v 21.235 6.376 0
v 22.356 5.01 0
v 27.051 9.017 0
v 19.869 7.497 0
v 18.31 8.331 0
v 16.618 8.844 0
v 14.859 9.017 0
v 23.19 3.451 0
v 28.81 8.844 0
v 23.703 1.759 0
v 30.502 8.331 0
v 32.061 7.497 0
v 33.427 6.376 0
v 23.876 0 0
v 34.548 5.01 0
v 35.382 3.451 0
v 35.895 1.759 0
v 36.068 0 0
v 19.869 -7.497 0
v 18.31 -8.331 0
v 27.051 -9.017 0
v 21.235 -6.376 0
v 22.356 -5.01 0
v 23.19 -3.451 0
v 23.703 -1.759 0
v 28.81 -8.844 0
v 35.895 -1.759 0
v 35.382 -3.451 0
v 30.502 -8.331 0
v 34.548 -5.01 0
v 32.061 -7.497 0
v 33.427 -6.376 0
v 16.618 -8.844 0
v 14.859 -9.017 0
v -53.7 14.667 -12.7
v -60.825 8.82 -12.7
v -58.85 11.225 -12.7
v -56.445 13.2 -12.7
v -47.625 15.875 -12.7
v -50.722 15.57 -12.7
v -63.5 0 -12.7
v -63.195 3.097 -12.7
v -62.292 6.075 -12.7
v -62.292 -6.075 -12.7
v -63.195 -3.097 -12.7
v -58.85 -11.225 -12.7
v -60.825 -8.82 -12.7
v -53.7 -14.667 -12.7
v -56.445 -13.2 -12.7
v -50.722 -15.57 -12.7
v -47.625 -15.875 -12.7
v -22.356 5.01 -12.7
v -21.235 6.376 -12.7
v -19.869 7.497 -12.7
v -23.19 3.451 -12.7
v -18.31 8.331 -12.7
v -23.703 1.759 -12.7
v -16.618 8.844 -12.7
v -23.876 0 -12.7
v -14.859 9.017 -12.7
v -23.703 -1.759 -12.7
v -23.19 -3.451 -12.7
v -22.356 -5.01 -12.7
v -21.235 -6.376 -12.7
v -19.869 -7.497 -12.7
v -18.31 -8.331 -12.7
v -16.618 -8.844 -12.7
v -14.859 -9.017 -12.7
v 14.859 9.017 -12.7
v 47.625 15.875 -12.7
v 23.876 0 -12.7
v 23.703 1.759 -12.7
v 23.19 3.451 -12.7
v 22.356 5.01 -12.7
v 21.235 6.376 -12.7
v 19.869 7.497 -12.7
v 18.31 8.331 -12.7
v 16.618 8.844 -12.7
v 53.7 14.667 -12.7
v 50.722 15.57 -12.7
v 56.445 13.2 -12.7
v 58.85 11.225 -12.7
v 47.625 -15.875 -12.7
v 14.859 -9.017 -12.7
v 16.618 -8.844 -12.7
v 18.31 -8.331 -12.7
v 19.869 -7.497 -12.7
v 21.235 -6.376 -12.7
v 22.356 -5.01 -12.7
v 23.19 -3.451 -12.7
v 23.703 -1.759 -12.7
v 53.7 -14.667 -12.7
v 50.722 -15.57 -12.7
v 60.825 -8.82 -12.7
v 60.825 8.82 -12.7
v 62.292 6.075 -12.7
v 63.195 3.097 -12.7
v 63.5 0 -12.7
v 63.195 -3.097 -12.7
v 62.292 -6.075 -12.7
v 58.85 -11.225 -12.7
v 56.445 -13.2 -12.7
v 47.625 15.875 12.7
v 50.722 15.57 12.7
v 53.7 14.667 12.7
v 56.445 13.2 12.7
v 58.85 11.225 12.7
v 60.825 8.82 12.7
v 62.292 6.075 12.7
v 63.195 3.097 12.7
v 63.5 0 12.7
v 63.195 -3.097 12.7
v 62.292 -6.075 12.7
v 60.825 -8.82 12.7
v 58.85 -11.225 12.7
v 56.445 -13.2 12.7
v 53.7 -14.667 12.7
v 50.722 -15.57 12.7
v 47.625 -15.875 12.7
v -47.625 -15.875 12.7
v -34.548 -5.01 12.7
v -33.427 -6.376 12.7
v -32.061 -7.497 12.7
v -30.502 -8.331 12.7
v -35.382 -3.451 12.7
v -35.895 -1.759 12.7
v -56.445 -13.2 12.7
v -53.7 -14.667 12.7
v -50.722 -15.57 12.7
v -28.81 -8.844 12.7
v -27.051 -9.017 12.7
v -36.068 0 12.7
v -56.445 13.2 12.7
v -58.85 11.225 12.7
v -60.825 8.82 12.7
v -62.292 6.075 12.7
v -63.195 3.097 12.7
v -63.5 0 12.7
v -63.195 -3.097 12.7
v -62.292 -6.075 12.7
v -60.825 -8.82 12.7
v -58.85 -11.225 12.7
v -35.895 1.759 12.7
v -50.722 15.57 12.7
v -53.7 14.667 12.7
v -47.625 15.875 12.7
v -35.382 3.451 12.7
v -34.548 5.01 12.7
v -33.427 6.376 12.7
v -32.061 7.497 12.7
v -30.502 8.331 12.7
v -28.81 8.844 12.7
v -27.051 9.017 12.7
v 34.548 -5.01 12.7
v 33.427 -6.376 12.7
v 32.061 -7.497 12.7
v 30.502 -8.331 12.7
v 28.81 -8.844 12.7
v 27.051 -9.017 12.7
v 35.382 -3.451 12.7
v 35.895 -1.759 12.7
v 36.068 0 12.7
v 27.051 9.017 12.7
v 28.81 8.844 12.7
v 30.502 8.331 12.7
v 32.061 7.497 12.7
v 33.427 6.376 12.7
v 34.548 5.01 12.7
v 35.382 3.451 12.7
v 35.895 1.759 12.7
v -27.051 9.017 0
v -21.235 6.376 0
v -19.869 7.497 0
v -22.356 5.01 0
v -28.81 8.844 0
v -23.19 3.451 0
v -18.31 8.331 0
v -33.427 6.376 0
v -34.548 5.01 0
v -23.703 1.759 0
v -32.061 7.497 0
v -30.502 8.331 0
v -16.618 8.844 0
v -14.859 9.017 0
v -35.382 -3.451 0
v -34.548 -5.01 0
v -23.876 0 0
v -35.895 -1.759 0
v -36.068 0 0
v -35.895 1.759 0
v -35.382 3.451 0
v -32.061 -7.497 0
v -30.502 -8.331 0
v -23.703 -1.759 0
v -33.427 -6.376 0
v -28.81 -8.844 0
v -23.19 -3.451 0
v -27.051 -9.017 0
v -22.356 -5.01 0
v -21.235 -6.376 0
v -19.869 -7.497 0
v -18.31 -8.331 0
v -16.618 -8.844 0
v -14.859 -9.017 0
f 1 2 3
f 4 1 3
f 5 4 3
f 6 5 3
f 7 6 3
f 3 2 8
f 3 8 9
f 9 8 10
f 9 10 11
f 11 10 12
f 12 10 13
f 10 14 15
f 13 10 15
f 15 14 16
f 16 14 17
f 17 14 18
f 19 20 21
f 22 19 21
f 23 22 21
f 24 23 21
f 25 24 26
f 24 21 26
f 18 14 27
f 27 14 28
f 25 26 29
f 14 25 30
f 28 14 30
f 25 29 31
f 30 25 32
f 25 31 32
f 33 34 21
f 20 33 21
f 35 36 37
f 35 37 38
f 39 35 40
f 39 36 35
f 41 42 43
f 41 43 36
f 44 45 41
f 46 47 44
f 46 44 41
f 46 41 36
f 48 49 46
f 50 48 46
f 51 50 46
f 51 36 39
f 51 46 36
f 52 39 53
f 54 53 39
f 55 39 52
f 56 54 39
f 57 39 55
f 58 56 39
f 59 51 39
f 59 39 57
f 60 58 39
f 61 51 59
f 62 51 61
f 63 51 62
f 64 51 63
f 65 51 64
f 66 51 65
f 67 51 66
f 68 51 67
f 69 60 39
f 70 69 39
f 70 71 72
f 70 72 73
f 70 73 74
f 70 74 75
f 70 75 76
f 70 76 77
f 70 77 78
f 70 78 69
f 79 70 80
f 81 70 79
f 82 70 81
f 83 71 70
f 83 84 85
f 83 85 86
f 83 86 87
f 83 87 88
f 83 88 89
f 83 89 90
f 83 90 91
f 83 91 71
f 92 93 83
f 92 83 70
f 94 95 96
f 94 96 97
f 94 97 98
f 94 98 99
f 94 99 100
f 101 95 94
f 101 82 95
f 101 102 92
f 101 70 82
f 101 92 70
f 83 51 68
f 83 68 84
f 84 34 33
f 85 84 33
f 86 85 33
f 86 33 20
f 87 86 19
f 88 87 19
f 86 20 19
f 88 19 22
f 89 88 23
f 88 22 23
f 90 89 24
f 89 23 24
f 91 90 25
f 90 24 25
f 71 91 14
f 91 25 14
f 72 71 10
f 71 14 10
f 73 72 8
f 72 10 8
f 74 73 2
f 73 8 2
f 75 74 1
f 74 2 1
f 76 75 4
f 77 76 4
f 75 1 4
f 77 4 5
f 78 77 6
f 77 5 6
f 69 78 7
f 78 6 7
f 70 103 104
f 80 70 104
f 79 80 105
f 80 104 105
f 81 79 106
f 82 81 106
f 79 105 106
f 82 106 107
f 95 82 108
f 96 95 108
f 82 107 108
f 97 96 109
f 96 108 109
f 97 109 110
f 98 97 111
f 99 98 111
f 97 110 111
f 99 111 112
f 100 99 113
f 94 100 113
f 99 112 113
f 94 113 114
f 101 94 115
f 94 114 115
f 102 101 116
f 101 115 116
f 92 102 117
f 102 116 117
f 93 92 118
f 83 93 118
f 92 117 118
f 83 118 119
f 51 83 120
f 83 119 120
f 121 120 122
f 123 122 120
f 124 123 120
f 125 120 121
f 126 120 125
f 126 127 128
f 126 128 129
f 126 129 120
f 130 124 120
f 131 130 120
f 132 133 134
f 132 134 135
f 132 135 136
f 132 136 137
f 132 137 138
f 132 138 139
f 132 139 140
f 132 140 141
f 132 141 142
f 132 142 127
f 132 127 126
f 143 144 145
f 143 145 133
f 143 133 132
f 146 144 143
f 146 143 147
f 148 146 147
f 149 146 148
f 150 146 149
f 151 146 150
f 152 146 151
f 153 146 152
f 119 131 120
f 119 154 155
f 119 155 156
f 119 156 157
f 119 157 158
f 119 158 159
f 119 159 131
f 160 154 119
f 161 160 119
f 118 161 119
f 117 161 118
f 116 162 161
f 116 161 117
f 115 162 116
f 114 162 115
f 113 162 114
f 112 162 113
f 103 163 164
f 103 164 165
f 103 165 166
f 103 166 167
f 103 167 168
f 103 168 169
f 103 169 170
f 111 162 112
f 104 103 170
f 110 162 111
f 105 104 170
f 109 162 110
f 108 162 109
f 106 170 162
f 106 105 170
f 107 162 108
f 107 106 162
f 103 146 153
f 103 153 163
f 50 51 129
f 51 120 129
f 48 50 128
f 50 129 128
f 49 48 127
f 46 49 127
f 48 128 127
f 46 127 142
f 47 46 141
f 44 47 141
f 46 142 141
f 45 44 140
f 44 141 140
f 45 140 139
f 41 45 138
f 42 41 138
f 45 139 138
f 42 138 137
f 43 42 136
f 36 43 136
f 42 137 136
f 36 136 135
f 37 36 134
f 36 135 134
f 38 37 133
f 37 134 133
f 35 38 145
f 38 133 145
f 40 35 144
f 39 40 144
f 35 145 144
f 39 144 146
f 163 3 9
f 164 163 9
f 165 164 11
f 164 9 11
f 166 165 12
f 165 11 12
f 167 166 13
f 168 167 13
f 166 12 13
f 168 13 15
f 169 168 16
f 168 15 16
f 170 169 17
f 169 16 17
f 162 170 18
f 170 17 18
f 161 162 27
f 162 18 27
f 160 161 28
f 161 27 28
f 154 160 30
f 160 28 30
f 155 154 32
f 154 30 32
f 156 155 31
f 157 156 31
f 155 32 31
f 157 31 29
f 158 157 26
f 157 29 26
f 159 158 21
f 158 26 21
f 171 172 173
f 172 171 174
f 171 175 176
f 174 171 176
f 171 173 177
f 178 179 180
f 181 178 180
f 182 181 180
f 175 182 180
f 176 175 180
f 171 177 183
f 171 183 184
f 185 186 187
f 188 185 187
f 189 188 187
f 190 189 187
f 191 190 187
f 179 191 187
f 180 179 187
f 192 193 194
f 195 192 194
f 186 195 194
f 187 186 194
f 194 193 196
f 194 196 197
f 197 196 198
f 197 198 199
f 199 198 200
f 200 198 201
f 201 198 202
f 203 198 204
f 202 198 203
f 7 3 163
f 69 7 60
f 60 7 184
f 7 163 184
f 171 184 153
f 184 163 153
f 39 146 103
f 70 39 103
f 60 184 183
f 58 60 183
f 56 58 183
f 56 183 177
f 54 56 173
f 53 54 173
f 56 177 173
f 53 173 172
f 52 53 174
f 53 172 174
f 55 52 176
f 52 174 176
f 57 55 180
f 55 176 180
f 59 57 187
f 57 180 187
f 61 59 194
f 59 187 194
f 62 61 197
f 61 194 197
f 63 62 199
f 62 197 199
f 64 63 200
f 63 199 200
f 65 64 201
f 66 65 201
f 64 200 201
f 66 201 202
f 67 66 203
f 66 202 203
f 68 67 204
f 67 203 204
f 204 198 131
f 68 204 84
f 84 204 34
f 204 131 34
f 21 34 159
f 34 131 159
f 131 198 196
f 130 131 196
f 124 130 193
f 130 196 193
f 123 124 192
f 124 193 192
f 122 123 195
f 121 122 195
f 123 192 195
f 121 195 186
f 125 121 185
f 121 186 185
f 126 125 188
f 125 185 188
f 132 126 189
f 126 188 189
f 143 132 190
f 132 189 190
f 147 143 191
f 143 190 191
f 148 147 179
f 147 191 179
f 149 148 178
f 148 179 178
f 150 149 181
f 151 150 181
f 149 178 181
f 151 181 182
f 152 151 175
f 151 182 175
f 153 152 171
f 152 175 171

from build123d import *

# Parameters (mm, degrees)
F1_DEPTH = 12.7
F3_DEPTH = 12.7


with BuildPart() as f1:
    # F0 (on Top) → F1 (new body)
    with BuildSketch(Plane.XY):
        with BuildLine():
            Line((-47.625, -15.875), (47.625, -15.875))
            ThreePointArc((47.625, -15.875), (63.5, 0), (47.625, 15.875))
            Line((47.625, 15.875), (-47.625, 15.875))
            ThreePointArc((-47.625, 15.875), (-63.5, 0), (-47.625, -15.875))
        make_face()
        with BuildLine():
            ThreePointArc((27.051, 9.017), (36.068, 0), (27.051, -9.017))
            Line((27.051, -9.017), (-27.051, -9.017))
            ThreePointArc((-27.051, -9.017), (-36.068, 0), (-27.051, 9.017))
            Line((-27.051, 9.017), (27.051, 9.017))
        make_face(mode=Mode.SUBTRACT)
    extrude(amount=F1_DEPTH)

    # F2 (on face) → F3 (join)
    with BuildSketch(Plane(origin=(0, 0, 0), x_dir=(1, 0, 0), z_dir=(0, 0, -1))):
        with BuildLine():
            ThreePointArc((47.625, -15.875), (63.5, 0), (47.625, 15.875))
            Line((47.625, 15.875), (-47.625, 15.875))
            ThreePointArc((-47.625, 15.875), (-63.5, 0), (-47.625, -15.875))
            Line((-47.625, -15.875), (47.625, -15.875))
        make_face()
        with BuildLine():
            Line((27.051, -9.017), (14.859, -9.017))
            Line((14.859, -9.017), (-14.859, -9.017))
            Line((-14.859, -9.017), (-27.051, -9.017))
            ThreePointArc((-27.051, -9.017), (-36.068, 0), (-27.051, 9.017))
            Line((-27.051, 9.017), (-14.859, 9.017))
            Line((-14.859, 9.017), (14.859, 9.017))
            Line((14.859, 9.017), (27.051, 9.017))
            ThreePointArc((27.051, 9.017), (36.068, 0), (27.051, -9.017))
        make_face(mode=Mode.SUBTRACT)
        with BuildLine():
            Line((-27.051, -9.017), (-14.859, -9.017))
            ThreePointArc((-14.859, -9.017), (-23.876, 0), (-14.859, 9.017))
            Line((-14.859, 9.017), (-27.051, 9.017))
            ThreePointArc((-27.051, 9.017), (-36.068, 0), (-27.051, -9.017))
        make_face()
        with BuildLine():
            ThreePointArc((14.859, 9.017), (23.876, 0), (14.859, -9.017))
            Line((14.859, -9.017), (27.051, -9.017))
            ThreePointArc((27.051, -9.017), (36.068, 0), (27.051, 9.017))
            Line((27.051, 9.017), (14.859, 9.017))
        make_face()
    extrude(amount=F3_DEPTH)


solid = f1.part
